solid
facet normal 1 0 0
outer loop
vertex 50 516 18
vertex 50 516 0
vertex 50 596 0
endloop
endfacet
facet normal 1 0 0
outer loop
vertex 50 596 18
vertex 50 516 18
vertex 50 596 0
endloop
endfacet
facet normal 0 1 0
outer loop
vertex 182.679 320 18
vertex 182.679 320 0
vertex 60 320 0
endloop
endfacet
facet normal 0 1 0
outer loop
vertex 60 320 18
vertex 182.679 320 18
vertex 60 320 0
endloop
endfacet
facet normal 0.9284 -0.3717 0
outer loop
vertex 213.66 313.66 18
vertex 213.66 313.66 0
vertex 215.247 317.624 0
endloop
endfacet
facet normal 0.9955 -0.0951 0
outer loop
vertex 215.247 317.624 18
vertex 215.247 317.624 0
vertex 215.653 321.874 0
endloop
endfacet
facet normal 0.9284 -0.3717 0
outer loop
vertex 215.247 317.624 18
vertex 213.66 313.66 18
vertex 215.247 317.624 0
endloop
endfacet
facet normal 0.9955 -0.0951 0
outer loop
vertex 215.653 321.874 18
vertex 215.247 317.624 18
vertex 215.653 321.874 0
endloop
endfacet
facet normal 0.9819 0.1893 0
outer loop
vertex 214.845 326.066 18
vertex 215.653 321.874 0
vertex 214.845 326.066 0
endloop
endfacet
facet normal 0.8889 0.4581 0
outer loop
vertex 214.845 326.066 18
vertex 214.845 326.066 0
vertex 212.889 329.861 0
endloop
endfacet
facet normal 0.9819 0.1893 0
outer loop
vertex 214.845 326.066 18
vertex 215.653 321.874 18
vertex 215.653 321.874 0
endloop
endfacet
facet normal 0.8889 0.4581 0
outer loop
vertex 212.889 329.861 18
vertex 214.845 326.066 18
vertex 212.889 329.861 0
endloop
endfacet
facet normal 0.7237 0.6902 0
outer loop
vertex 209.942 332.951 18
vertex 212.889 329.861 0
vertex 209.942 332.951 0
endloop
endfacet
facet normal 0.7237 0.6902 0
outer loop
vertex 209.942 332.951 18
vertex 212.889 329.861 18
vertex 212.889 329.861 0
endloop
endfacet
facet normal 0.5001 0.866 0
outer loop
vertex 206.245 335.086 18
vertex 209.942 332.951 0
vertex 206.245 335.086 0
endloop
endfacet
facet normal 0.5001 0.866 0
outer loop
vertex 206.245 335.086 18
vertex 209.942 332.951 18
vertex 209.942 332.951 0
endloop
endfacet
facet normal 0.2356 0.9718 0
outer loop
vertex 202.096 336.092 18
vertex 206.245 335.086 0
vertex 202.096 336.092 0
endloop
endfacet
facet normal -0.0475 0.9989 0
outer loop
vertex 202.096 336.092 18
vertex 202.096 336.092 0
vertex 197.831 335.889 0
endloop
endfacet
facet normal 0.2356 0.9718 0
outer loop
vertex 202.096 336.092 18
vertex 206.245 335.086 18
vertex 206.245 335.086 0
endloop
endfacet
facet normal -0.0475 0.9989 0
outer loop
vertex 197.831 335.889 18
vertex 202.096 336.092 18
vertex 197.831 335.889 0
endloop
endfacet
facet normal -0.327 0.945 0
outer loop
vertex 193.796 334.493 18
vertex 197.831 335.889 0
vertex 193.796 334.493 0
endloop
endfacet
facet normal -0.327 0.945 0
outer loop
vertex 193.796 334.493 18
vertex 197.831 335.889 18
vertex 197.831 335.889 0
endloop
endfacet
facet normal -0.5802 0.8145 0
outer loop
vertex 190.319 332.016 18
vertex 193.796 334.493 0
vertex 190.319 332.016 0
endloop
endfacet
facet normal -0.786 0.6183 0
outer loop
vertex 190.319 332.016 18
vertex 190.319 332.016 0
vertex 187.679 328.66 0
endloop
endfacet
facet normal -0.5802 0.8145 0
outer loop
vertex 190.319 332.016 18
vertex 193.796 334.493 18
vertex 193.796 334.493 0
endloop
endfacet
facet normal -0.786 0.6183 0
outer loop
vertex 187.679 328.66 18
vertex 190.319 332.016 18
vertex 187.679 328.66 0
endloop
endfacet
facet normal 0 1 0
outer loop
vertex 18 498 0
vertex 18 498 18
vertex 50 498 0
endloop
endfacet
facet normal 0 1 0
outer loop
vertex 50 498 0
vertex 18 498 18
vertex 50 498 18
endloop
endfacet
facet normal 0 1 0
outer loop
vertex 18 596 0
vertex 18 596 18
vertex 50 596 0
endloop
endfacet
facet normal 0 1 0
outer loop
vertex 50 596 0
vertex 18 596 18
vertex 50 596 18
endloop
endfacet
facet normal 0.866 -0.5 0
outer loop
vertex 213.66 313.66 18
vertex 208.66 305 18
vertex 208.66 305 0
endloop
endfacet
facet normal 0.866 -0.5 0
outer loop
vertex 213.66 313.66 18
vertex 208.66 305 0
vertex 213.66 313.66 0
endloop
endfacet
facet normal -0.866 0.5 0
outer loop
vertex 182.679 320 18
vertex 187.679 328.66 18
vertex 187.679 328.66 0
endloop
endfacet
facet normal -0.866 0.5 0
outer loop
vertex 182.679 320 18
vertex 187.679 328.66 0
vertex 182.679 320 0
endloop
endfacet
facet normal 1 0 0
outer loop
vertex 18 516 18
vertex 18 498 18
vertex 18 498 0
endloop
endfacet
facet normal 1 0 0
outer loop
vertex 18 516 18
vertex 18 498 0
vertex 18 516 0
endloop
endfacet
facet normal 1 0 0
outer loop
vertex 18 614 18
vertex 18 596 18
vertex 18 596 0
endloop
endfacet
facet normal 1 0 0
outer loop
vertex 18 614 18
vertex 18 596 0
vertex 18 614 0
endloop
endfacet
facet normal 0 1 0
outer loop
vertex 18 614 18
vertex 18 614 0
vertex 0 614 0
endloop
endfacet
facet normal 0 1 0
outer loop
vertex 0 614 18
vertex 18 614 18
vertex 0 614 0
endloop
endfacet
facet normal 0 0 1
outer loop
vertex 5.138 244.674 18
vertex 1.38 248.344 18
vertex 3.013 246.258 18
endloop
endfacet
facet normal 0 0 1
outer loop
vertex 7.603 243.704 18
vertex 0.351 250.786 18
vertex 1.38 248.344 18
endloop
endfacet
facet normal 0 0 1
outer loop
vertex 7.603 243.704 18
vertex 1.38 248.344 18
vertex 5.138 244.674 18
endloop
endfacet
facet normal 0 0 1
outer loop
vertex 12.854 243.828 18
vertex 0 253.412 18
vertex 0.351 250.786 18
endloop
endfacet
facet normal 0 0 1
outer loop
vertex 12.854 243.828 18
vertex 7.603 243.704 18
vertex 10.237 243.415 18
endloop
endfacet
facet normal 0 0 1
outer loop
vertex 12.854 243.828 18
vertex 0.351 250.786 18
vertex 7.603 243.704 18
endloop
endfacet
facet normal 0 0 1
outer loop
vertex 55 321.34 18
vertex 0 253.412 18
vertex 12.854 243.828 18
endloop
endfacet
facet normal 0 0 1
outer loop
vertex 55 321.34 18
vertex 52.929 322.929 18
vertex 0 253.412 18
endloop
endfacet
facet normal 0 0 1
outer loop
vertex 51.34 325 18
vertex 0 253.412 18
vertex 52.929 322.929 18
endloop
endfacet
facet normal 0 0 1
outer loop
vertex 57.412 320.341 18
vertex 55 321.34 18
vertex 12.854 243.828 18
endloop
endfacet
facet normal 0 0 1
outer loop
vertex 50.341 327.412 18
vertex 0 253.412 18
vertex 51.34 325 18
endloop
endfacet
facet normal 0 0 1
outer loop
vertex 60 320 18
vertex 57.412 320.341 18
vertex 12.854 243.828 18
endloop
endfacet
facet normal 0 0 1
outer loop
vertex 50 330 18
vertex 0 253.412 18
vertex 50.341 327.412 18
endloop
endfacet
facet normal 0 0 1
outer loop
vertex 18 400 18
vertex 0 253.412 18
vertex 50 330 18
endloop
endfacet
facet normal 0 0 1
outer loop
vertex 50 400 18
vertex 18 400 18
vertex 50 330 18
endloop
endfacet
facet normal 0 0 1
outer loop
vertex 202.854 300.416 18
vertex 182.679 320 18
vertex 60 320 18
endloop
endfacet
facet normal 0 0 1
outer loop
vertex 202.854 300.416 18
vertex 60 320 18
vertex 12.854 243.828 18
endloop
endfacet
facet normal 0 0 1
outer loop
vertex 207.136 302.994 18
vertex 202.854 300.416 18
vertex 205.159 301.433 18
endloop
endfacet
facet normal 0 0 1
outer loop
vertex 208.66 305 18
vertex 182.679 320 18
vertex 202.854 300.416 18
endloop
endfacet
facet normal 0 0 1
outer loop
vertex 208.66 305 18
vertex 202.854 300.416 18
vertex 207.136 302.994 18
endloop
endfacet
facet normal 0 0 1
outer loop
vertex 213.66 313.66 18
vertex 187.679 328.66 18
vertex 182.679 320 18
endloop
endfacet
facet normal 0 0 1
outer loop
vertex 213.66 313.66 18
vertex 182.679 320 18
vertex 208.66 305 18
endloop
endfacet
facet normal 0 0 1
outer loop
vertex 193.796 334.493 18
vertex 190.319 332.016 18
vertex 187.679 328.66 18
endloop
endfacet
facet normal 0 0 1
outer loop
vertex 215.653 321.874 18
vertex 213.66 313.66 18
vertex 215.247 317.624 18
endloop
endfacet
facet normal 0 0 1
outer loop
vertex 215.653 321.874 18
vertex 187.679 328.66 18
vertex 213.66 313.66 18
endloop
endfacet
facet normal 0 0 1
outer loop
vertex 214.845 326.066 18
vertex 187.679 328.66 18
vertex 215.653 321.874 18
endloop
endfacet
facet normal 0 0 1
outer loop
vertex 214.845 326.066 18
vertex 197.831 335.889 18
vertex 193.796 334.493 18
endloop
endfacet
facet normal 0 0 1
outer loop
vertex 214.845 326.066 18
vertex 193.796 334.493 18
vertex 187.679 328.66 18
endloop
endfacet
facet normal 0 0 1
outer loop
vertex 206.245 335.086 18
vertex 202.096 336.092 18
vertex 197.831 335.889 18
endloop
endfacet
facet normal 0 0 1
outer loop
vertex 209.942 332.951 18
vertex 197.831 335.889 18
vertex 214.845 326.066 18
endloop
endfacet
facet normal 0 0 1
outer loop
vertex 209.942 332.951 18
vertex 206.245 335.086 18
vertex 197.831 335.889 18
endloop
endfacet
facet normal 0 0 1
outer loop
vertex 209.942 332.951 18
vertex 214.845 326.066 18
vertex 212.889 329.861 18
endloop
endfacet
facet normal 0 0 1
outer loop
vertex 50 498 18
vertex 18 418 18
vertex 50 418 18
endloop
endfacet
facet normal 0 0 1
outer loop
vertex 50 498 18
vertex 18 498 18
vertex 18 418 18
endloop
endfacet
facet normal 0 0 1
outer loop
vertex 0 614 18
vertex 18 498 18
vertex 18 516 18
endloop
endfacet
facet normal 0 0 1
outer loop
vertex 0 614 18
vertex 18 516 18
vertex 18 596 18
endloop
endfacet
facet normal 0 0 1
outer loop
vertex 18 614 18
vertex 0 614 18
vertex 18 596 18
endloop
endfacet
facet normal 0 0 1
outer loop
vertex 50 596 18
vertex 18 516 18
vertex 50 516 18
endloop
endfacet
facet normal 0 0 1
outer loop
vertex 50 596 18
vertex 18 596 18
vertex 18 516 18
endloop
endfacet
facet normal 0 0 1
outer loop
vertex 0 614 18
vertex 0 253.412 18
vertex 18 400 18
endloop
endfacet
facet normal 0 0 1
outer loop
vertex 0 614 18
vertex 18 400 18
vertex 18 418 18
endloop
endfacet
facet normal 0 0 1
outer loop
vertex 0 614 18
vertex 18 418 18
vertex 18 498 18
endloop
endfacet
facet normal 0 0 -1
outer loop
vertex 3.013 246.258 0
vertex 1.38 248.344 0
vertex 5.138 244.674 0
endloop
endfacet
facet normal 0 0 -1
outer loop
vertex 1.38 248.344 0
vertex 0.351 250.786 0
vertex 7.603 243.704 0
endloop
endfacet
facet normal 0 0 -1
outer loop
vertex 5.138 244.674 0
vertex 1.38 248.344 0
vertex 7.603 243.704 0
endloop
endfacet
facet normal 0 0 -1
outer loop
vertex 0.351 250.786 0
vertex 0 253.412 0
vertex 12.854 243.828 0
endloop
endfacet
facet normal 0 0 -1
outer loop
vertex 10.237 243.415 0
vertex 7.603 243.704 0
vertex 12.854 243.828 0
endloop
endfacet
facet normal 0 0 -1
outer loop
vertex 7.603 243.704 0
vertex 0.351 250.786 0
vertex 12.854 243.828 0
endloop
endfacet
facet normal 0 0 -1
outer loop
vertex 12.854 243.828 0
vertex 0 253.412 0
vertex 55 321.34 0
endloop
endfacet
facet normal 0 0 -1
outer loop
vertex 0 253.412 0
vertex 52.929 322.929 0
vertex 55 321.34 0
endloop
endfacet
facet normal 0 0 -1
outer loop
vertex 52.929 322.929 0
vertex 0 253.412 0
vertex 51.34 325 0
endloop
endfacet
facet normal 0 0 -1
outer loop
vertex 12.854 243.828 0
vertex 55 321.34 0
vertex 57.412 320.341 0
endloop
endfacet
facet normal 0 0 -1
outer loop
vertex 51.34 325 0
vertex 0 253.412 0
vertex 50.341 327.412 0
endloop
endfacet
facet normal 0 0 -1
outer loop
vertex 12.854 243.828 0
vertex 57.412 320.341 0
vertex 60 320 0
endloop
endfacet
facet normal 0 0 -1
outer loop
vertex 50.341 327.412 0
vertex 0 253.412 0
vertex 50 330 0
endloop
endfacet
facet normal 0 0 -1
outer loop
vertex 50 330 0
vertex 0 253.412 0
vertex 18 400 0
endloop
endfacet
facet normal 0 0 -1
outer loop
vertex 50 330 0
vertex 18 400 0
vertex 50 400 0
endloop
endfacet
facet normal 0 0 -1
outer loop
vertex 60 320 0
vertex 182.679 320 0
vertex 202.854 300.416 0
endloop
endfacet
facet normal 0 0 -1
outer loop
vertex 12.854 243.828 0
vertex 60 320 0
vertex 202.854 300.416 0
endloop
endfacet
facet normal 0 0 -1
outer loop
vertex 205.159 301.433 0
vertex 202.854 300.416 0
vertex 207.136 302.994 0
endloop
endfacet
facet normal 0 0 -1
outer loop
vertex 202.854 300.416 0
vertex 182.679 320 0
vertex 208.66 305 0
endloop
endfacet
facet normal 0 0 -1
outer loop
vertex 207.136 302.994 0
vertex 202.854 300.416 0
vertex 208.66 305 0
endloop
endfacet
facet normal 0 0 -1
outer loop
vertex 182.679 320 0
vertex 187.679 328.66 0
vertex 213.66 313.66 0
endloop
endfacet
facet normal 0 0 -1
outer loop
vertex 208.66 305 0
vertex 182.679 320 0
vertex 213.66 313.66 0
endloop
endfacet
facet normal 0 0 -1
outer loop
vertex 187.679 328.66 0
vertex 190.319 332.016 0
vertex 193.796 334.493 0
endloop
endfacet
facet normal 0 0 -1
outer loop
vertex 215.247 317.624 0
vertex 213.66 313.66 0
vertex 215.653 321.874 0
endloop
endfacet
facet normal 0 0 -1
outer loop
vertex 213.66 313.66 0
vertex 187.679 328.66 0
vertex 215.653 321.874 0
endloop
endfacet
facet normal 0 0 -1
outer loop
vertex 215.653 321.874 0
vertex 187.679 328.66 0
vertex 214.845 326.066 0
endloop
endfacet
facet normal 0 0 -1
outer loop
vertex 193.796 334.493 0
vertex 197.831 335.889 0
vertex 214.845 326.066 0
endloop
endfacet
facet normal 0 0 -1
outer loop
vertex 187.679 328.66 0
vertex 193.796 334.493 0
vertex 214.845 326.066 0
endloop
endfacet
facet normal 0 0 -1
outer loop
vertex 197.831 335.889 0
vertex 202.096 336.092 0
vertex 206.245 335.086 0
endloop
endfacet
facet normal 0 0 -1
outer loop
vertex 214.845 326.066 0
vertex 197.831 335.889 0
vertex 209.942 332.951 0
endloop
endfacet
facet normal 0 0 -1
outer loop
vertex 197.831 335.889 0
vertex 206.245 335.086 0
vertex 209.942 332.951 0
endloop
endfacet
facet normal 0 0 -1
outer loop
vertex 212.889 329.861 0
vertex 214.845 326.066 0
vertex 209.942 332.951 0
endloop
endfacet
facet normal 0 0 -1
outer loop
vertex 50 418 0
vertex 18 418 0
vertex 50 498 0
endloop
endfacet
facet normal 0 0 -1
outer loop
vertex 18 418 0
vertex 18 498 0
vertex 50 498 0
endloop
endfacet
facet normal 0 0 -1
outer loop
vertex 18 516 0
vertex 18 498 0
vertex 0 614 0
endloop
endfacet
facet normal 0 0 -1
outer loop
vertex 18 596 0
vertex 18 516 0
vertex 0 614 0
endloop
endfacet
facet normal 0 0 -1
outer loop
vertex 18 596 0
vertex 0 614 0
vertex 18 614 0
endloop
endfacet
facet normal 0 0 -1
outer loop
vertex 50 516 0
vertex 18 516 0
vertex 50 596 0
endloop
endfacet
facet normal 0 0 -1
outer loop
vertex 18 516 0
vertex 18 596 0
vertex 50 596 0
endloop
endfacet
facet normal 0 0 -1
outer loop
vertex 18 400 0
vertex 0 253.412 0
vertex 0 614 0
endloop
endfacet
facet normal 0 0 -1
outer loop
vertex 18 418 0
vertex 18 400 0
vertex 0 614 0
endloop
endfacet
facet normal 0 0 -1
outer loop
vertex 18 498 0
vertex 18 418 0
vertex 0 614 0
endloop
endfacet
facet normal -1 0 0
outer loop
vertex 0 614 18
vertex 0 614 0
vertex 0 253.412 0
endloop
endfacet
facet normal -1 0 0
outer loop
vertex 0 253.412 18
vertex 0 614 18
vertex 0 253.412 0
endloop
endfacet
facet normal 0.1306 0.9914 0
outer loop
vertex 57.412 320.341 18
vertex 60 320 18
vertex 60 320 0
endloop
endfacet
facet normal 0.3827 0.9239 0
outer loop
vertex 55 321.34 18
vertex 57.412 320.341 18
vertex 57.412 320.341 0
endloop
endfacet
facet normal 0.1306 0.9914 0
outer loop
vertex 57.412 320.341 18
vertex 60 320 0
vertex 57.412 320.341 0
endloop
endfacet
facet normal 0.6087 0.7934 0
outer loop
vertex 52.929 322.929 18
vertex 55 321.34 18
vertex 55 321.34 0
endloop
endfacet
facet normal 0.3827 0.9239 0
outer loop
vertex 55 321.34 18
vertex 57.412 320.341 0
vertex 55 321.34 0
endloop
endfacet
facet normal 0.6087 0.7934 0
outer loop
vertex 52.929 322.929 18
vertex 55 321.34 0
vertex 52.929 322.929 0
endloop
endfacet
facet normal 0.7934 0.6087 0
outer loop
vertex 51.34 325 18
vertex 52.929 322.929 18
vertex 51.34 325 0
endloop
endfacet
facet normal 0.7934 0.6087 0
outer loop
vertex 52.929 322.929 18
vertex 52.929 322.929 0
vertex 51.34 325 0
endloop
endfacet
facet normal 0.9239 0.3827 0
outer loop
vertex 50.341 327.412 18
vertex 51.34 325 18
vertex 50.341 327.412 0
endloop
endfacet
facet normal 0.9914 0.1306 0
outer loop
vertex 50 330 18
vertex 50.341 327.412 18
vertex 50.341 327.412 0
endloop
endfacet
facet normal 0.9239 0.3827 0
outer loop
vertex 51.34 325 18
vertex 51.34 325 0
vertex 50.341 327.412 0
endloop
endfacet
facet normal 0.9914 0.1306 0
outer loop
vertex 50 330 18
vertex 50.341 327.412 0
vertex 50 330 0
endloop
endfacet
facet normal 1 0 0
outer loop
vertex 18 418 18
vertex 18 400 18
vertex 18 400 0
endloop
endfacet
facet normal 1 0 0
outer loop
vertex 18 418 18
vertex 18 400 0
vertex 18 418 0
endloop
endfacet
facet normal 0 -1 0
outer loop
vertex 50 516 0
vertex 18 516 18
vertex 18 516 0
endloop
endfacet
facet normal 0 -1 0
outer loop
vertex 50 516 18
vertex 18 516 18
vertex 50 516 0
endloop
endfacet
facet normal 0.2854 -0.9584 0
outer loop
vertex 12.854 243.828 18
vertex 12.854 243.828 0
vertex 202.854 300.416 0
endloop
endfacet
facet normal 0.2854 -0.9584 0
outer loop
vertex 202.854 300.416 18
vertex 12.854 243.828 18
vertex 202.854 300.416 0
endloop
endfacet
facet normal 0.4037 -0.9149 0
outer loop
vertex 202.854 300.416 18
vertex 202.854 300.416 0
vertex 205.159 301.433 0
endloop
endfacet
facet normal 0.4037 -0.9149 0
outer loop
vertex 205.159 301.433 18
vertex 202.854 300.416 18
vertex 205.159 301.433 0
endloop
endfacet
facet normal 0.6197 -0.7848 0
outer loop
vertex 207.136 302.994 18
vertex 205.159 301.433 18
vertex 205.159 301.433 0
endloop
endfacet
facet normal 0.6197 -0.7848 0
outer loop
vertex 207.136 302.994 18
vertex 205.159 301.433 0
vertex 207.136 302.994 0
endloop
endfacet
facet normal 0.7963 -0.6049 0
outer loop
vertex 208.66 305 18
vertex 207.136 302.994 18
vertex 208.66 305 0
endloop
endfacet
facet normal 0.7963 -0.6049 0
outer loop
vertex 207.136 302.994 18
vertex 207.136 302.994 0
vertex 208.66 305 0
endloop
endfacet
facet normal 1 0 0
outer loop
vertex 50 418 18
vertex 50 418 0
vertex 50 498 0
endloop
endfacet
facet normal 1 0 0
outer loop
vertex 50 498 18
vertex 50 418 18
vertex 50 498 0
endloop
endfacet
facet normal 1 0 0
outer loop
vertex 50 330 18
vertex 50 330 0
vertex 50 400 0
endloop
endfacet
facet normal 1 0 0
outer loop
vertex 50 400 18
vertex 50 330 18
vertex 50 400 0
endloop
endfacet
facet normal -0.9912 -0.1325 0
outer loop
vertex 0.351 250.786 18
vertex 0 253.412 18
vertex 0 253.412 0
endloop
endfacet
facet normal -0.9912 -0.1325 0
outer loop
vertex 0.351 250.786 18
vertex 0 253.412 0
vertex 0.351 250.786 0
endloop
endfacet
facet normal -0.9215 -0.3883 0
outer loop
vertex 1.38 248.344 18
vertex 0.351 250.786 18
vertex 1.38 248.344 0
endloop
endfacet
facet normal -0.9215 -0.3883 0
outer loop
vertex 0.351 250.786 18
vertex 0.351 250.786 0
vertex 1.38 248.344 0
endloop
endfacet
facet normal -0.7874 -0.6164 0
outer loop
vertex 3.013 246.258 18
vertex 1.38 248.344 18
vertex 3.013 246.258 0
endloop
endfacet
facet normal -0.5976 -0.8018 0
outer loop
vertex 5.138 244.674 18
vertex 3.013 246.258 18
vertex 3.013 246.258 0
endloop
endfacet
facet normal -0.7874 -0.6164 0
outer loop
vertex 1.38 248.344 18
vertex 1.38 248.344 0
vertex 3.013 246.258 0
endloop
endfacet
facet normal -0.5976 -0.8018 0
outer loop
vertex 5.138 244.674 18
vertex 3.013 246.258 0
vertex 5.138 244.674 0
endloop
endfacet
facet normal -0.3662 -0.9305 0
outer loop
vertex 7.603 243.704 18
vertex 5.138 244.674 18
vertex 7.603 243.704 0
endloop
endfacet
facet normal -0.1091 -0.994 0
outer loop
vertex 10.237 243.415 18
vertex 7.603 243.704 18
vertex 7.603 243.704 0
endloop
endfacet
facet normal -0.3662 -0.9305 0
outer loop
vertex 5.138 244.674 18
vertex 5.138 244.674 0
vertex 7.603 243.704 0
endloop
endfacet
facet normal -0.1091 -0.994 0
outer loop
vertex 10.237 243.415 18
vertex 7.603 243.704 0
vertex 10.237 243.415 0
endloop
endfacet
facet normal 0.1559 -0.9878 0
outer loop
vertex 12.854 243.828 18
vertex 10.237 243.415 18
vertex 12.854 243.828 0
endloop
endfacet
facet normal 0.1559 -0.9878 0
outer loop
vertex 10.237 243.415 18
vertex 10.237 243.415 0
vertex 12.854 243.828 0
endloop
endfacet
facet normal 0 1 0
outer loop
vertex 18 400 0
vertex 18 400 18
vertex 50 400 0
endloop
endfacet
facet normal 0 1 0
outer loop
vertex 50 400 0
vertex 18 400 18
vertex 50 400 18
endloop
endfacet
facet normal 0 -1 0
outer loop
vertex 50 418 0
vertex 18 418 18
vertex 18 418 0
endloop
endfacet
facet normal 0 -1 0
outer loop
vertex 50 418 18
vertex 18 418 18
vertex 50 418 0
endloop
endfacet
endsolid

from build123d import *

# Parameters (mm, degrees)
BOSS_EXTRU_1_DEPTH      = 18
ESQUISSE2_W             = 32
ESQUISSE2_H             = 18
ENL_V_MAT_EXTRU_1_DEPTH = 650.168699184
BOSS_EXTRU_2_DEPTH      = 18


with BuildPart() as part:
    # Esquisse1 → Boss.-Extru.1 (new body)
    with BuildSketch(Plane.XY):
        with BuildLine():
            Line((0, 614), (0, 253.412385947))
            ThreePointArc((0, 253.412385947), (4.022705111, 245.395407351), (12.854389163, 243.82841691))
            Line((12.854389163, 243.82841691), (202.854389163, 300.416030963))
            ThreePointArc((202.854389163, 300.416030963), (209.895445679, 311.442274181), (200, 320))
            Line((200, 320), (60, 320))
            ThreePointArc((60, 320), (52.928932188, 322.928932188), (50, 330))
            Line((50, 330), (50, 614))
            Line((50, 614), (0, 614))
        make_face()
    extrude(amount=BOSS_EXTRU_1_DEPTH)

    # Esquisse2 → Enlèv. mat.-Extru.1 (cut, through all)
    with BuildSketch(Plane.XY.offset(18)):
        with Locations((34, 605)):
            Rectangle(ESQUISSE2_W, ESQUISSE2_H)
        with Locations((34, 507)):
            Rectangle(ESQUISSE2_W, ESQUISSE2_H)
        with Locations((34, 409)):
            Rectangle(ESQUISSE2_W, ESQUISSE2_H)
    extrude(amount=-ENL_V_MAT_EXTRU_1_DEPTH, mode=Mode.SUBTRACT)

    # Esquisse3 → Boss.-Extru.2 (add)
    with BuildSketch(Plane.XY.offset(18)):
        with BuildLine():
            Line((208.660254038, 305), (213.660254038, 313.660254038))
            ThreePointArc((213.660254038, 313.660254038), (208.169872981, 334.150635095), (187.679491924, 328.660254038))
            Line((187.679491924, 328.660254038), (182.679491924, 320))
            Line((182.679491924, 320), (208.660254038, 305))
        make_face()
    extrude(amount=-BOSS_EXTRU_2_DEPTH)


solid = part.part
